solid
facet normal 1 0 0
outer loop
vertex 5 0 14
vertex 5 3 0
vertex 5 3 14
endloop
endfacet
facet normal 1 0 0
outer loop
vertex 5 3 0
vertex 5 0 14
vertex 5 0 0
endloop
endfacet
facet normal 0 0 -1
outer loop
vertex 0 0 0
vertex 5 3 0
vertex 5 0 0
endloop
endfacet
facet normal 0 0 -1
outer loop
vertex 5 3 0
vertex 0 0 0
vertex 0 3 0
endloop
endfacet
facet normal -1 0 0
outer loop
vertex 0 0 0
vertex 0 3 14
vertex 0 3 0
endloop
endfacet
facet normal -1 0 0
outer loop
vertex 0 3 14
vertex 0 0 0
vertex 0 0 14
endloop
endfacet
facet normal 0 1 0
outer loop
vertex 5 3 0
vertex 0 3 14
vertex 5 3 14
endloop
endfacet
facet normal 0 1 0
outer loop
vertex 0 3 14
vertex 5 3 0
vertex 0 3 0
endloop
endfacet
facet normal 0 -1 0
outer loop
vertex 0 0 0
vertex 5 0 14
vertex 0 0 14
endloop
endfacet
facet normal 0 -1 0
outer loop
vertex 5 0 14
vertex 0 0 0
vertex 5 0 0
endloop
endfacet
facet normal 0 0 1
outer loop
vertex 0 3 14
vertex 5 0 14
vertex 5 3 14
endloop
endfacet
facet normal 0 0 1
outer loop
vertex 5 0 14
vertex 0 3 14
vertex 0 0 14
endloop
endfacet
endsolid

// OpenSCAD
translate([2.5, 1.5, 1.0]) color([0.3715816420064585, 0.19047756087385292, 0.3565538137373233]) cube([5, 3, 2], center=true);
translate([2.5, 1.5, 3.0]) color([0.6320134108911423, 0.9564975354421206, 0.901927522825372]) cube([5, 3, 2], center=true);
translate([2.5, 1.5, 5.0]) color([0.039980675922074105, 0.2553863294502452, 0.02665600139486224]) cube([5, 3, 2], center=true);
translate([2.5, 1.5, 7.0]) color([0.5200631817170318, 0.5692567569896342, 0.8758772851227178]) cube([5, 3, 2], center=true);
translate([2.5, 1.5, 9.0]) color([0.2296552367022351, 0.7763426439418957, 0.8846860519705121]) cube([5, 3, 2], center=true);
translate([2.5, 1.5, 11.0]) color([0.6274277551427163, 0.5024128608294012, 0.5237115354844265]) cube([5, 3, 2], center=true);
translate([2.5, 1.5, 13.0]) color([0.5071067236759631, 0.9454855480301745, 0.14569042195357562]) cube([5, 3, 2], center=true);
